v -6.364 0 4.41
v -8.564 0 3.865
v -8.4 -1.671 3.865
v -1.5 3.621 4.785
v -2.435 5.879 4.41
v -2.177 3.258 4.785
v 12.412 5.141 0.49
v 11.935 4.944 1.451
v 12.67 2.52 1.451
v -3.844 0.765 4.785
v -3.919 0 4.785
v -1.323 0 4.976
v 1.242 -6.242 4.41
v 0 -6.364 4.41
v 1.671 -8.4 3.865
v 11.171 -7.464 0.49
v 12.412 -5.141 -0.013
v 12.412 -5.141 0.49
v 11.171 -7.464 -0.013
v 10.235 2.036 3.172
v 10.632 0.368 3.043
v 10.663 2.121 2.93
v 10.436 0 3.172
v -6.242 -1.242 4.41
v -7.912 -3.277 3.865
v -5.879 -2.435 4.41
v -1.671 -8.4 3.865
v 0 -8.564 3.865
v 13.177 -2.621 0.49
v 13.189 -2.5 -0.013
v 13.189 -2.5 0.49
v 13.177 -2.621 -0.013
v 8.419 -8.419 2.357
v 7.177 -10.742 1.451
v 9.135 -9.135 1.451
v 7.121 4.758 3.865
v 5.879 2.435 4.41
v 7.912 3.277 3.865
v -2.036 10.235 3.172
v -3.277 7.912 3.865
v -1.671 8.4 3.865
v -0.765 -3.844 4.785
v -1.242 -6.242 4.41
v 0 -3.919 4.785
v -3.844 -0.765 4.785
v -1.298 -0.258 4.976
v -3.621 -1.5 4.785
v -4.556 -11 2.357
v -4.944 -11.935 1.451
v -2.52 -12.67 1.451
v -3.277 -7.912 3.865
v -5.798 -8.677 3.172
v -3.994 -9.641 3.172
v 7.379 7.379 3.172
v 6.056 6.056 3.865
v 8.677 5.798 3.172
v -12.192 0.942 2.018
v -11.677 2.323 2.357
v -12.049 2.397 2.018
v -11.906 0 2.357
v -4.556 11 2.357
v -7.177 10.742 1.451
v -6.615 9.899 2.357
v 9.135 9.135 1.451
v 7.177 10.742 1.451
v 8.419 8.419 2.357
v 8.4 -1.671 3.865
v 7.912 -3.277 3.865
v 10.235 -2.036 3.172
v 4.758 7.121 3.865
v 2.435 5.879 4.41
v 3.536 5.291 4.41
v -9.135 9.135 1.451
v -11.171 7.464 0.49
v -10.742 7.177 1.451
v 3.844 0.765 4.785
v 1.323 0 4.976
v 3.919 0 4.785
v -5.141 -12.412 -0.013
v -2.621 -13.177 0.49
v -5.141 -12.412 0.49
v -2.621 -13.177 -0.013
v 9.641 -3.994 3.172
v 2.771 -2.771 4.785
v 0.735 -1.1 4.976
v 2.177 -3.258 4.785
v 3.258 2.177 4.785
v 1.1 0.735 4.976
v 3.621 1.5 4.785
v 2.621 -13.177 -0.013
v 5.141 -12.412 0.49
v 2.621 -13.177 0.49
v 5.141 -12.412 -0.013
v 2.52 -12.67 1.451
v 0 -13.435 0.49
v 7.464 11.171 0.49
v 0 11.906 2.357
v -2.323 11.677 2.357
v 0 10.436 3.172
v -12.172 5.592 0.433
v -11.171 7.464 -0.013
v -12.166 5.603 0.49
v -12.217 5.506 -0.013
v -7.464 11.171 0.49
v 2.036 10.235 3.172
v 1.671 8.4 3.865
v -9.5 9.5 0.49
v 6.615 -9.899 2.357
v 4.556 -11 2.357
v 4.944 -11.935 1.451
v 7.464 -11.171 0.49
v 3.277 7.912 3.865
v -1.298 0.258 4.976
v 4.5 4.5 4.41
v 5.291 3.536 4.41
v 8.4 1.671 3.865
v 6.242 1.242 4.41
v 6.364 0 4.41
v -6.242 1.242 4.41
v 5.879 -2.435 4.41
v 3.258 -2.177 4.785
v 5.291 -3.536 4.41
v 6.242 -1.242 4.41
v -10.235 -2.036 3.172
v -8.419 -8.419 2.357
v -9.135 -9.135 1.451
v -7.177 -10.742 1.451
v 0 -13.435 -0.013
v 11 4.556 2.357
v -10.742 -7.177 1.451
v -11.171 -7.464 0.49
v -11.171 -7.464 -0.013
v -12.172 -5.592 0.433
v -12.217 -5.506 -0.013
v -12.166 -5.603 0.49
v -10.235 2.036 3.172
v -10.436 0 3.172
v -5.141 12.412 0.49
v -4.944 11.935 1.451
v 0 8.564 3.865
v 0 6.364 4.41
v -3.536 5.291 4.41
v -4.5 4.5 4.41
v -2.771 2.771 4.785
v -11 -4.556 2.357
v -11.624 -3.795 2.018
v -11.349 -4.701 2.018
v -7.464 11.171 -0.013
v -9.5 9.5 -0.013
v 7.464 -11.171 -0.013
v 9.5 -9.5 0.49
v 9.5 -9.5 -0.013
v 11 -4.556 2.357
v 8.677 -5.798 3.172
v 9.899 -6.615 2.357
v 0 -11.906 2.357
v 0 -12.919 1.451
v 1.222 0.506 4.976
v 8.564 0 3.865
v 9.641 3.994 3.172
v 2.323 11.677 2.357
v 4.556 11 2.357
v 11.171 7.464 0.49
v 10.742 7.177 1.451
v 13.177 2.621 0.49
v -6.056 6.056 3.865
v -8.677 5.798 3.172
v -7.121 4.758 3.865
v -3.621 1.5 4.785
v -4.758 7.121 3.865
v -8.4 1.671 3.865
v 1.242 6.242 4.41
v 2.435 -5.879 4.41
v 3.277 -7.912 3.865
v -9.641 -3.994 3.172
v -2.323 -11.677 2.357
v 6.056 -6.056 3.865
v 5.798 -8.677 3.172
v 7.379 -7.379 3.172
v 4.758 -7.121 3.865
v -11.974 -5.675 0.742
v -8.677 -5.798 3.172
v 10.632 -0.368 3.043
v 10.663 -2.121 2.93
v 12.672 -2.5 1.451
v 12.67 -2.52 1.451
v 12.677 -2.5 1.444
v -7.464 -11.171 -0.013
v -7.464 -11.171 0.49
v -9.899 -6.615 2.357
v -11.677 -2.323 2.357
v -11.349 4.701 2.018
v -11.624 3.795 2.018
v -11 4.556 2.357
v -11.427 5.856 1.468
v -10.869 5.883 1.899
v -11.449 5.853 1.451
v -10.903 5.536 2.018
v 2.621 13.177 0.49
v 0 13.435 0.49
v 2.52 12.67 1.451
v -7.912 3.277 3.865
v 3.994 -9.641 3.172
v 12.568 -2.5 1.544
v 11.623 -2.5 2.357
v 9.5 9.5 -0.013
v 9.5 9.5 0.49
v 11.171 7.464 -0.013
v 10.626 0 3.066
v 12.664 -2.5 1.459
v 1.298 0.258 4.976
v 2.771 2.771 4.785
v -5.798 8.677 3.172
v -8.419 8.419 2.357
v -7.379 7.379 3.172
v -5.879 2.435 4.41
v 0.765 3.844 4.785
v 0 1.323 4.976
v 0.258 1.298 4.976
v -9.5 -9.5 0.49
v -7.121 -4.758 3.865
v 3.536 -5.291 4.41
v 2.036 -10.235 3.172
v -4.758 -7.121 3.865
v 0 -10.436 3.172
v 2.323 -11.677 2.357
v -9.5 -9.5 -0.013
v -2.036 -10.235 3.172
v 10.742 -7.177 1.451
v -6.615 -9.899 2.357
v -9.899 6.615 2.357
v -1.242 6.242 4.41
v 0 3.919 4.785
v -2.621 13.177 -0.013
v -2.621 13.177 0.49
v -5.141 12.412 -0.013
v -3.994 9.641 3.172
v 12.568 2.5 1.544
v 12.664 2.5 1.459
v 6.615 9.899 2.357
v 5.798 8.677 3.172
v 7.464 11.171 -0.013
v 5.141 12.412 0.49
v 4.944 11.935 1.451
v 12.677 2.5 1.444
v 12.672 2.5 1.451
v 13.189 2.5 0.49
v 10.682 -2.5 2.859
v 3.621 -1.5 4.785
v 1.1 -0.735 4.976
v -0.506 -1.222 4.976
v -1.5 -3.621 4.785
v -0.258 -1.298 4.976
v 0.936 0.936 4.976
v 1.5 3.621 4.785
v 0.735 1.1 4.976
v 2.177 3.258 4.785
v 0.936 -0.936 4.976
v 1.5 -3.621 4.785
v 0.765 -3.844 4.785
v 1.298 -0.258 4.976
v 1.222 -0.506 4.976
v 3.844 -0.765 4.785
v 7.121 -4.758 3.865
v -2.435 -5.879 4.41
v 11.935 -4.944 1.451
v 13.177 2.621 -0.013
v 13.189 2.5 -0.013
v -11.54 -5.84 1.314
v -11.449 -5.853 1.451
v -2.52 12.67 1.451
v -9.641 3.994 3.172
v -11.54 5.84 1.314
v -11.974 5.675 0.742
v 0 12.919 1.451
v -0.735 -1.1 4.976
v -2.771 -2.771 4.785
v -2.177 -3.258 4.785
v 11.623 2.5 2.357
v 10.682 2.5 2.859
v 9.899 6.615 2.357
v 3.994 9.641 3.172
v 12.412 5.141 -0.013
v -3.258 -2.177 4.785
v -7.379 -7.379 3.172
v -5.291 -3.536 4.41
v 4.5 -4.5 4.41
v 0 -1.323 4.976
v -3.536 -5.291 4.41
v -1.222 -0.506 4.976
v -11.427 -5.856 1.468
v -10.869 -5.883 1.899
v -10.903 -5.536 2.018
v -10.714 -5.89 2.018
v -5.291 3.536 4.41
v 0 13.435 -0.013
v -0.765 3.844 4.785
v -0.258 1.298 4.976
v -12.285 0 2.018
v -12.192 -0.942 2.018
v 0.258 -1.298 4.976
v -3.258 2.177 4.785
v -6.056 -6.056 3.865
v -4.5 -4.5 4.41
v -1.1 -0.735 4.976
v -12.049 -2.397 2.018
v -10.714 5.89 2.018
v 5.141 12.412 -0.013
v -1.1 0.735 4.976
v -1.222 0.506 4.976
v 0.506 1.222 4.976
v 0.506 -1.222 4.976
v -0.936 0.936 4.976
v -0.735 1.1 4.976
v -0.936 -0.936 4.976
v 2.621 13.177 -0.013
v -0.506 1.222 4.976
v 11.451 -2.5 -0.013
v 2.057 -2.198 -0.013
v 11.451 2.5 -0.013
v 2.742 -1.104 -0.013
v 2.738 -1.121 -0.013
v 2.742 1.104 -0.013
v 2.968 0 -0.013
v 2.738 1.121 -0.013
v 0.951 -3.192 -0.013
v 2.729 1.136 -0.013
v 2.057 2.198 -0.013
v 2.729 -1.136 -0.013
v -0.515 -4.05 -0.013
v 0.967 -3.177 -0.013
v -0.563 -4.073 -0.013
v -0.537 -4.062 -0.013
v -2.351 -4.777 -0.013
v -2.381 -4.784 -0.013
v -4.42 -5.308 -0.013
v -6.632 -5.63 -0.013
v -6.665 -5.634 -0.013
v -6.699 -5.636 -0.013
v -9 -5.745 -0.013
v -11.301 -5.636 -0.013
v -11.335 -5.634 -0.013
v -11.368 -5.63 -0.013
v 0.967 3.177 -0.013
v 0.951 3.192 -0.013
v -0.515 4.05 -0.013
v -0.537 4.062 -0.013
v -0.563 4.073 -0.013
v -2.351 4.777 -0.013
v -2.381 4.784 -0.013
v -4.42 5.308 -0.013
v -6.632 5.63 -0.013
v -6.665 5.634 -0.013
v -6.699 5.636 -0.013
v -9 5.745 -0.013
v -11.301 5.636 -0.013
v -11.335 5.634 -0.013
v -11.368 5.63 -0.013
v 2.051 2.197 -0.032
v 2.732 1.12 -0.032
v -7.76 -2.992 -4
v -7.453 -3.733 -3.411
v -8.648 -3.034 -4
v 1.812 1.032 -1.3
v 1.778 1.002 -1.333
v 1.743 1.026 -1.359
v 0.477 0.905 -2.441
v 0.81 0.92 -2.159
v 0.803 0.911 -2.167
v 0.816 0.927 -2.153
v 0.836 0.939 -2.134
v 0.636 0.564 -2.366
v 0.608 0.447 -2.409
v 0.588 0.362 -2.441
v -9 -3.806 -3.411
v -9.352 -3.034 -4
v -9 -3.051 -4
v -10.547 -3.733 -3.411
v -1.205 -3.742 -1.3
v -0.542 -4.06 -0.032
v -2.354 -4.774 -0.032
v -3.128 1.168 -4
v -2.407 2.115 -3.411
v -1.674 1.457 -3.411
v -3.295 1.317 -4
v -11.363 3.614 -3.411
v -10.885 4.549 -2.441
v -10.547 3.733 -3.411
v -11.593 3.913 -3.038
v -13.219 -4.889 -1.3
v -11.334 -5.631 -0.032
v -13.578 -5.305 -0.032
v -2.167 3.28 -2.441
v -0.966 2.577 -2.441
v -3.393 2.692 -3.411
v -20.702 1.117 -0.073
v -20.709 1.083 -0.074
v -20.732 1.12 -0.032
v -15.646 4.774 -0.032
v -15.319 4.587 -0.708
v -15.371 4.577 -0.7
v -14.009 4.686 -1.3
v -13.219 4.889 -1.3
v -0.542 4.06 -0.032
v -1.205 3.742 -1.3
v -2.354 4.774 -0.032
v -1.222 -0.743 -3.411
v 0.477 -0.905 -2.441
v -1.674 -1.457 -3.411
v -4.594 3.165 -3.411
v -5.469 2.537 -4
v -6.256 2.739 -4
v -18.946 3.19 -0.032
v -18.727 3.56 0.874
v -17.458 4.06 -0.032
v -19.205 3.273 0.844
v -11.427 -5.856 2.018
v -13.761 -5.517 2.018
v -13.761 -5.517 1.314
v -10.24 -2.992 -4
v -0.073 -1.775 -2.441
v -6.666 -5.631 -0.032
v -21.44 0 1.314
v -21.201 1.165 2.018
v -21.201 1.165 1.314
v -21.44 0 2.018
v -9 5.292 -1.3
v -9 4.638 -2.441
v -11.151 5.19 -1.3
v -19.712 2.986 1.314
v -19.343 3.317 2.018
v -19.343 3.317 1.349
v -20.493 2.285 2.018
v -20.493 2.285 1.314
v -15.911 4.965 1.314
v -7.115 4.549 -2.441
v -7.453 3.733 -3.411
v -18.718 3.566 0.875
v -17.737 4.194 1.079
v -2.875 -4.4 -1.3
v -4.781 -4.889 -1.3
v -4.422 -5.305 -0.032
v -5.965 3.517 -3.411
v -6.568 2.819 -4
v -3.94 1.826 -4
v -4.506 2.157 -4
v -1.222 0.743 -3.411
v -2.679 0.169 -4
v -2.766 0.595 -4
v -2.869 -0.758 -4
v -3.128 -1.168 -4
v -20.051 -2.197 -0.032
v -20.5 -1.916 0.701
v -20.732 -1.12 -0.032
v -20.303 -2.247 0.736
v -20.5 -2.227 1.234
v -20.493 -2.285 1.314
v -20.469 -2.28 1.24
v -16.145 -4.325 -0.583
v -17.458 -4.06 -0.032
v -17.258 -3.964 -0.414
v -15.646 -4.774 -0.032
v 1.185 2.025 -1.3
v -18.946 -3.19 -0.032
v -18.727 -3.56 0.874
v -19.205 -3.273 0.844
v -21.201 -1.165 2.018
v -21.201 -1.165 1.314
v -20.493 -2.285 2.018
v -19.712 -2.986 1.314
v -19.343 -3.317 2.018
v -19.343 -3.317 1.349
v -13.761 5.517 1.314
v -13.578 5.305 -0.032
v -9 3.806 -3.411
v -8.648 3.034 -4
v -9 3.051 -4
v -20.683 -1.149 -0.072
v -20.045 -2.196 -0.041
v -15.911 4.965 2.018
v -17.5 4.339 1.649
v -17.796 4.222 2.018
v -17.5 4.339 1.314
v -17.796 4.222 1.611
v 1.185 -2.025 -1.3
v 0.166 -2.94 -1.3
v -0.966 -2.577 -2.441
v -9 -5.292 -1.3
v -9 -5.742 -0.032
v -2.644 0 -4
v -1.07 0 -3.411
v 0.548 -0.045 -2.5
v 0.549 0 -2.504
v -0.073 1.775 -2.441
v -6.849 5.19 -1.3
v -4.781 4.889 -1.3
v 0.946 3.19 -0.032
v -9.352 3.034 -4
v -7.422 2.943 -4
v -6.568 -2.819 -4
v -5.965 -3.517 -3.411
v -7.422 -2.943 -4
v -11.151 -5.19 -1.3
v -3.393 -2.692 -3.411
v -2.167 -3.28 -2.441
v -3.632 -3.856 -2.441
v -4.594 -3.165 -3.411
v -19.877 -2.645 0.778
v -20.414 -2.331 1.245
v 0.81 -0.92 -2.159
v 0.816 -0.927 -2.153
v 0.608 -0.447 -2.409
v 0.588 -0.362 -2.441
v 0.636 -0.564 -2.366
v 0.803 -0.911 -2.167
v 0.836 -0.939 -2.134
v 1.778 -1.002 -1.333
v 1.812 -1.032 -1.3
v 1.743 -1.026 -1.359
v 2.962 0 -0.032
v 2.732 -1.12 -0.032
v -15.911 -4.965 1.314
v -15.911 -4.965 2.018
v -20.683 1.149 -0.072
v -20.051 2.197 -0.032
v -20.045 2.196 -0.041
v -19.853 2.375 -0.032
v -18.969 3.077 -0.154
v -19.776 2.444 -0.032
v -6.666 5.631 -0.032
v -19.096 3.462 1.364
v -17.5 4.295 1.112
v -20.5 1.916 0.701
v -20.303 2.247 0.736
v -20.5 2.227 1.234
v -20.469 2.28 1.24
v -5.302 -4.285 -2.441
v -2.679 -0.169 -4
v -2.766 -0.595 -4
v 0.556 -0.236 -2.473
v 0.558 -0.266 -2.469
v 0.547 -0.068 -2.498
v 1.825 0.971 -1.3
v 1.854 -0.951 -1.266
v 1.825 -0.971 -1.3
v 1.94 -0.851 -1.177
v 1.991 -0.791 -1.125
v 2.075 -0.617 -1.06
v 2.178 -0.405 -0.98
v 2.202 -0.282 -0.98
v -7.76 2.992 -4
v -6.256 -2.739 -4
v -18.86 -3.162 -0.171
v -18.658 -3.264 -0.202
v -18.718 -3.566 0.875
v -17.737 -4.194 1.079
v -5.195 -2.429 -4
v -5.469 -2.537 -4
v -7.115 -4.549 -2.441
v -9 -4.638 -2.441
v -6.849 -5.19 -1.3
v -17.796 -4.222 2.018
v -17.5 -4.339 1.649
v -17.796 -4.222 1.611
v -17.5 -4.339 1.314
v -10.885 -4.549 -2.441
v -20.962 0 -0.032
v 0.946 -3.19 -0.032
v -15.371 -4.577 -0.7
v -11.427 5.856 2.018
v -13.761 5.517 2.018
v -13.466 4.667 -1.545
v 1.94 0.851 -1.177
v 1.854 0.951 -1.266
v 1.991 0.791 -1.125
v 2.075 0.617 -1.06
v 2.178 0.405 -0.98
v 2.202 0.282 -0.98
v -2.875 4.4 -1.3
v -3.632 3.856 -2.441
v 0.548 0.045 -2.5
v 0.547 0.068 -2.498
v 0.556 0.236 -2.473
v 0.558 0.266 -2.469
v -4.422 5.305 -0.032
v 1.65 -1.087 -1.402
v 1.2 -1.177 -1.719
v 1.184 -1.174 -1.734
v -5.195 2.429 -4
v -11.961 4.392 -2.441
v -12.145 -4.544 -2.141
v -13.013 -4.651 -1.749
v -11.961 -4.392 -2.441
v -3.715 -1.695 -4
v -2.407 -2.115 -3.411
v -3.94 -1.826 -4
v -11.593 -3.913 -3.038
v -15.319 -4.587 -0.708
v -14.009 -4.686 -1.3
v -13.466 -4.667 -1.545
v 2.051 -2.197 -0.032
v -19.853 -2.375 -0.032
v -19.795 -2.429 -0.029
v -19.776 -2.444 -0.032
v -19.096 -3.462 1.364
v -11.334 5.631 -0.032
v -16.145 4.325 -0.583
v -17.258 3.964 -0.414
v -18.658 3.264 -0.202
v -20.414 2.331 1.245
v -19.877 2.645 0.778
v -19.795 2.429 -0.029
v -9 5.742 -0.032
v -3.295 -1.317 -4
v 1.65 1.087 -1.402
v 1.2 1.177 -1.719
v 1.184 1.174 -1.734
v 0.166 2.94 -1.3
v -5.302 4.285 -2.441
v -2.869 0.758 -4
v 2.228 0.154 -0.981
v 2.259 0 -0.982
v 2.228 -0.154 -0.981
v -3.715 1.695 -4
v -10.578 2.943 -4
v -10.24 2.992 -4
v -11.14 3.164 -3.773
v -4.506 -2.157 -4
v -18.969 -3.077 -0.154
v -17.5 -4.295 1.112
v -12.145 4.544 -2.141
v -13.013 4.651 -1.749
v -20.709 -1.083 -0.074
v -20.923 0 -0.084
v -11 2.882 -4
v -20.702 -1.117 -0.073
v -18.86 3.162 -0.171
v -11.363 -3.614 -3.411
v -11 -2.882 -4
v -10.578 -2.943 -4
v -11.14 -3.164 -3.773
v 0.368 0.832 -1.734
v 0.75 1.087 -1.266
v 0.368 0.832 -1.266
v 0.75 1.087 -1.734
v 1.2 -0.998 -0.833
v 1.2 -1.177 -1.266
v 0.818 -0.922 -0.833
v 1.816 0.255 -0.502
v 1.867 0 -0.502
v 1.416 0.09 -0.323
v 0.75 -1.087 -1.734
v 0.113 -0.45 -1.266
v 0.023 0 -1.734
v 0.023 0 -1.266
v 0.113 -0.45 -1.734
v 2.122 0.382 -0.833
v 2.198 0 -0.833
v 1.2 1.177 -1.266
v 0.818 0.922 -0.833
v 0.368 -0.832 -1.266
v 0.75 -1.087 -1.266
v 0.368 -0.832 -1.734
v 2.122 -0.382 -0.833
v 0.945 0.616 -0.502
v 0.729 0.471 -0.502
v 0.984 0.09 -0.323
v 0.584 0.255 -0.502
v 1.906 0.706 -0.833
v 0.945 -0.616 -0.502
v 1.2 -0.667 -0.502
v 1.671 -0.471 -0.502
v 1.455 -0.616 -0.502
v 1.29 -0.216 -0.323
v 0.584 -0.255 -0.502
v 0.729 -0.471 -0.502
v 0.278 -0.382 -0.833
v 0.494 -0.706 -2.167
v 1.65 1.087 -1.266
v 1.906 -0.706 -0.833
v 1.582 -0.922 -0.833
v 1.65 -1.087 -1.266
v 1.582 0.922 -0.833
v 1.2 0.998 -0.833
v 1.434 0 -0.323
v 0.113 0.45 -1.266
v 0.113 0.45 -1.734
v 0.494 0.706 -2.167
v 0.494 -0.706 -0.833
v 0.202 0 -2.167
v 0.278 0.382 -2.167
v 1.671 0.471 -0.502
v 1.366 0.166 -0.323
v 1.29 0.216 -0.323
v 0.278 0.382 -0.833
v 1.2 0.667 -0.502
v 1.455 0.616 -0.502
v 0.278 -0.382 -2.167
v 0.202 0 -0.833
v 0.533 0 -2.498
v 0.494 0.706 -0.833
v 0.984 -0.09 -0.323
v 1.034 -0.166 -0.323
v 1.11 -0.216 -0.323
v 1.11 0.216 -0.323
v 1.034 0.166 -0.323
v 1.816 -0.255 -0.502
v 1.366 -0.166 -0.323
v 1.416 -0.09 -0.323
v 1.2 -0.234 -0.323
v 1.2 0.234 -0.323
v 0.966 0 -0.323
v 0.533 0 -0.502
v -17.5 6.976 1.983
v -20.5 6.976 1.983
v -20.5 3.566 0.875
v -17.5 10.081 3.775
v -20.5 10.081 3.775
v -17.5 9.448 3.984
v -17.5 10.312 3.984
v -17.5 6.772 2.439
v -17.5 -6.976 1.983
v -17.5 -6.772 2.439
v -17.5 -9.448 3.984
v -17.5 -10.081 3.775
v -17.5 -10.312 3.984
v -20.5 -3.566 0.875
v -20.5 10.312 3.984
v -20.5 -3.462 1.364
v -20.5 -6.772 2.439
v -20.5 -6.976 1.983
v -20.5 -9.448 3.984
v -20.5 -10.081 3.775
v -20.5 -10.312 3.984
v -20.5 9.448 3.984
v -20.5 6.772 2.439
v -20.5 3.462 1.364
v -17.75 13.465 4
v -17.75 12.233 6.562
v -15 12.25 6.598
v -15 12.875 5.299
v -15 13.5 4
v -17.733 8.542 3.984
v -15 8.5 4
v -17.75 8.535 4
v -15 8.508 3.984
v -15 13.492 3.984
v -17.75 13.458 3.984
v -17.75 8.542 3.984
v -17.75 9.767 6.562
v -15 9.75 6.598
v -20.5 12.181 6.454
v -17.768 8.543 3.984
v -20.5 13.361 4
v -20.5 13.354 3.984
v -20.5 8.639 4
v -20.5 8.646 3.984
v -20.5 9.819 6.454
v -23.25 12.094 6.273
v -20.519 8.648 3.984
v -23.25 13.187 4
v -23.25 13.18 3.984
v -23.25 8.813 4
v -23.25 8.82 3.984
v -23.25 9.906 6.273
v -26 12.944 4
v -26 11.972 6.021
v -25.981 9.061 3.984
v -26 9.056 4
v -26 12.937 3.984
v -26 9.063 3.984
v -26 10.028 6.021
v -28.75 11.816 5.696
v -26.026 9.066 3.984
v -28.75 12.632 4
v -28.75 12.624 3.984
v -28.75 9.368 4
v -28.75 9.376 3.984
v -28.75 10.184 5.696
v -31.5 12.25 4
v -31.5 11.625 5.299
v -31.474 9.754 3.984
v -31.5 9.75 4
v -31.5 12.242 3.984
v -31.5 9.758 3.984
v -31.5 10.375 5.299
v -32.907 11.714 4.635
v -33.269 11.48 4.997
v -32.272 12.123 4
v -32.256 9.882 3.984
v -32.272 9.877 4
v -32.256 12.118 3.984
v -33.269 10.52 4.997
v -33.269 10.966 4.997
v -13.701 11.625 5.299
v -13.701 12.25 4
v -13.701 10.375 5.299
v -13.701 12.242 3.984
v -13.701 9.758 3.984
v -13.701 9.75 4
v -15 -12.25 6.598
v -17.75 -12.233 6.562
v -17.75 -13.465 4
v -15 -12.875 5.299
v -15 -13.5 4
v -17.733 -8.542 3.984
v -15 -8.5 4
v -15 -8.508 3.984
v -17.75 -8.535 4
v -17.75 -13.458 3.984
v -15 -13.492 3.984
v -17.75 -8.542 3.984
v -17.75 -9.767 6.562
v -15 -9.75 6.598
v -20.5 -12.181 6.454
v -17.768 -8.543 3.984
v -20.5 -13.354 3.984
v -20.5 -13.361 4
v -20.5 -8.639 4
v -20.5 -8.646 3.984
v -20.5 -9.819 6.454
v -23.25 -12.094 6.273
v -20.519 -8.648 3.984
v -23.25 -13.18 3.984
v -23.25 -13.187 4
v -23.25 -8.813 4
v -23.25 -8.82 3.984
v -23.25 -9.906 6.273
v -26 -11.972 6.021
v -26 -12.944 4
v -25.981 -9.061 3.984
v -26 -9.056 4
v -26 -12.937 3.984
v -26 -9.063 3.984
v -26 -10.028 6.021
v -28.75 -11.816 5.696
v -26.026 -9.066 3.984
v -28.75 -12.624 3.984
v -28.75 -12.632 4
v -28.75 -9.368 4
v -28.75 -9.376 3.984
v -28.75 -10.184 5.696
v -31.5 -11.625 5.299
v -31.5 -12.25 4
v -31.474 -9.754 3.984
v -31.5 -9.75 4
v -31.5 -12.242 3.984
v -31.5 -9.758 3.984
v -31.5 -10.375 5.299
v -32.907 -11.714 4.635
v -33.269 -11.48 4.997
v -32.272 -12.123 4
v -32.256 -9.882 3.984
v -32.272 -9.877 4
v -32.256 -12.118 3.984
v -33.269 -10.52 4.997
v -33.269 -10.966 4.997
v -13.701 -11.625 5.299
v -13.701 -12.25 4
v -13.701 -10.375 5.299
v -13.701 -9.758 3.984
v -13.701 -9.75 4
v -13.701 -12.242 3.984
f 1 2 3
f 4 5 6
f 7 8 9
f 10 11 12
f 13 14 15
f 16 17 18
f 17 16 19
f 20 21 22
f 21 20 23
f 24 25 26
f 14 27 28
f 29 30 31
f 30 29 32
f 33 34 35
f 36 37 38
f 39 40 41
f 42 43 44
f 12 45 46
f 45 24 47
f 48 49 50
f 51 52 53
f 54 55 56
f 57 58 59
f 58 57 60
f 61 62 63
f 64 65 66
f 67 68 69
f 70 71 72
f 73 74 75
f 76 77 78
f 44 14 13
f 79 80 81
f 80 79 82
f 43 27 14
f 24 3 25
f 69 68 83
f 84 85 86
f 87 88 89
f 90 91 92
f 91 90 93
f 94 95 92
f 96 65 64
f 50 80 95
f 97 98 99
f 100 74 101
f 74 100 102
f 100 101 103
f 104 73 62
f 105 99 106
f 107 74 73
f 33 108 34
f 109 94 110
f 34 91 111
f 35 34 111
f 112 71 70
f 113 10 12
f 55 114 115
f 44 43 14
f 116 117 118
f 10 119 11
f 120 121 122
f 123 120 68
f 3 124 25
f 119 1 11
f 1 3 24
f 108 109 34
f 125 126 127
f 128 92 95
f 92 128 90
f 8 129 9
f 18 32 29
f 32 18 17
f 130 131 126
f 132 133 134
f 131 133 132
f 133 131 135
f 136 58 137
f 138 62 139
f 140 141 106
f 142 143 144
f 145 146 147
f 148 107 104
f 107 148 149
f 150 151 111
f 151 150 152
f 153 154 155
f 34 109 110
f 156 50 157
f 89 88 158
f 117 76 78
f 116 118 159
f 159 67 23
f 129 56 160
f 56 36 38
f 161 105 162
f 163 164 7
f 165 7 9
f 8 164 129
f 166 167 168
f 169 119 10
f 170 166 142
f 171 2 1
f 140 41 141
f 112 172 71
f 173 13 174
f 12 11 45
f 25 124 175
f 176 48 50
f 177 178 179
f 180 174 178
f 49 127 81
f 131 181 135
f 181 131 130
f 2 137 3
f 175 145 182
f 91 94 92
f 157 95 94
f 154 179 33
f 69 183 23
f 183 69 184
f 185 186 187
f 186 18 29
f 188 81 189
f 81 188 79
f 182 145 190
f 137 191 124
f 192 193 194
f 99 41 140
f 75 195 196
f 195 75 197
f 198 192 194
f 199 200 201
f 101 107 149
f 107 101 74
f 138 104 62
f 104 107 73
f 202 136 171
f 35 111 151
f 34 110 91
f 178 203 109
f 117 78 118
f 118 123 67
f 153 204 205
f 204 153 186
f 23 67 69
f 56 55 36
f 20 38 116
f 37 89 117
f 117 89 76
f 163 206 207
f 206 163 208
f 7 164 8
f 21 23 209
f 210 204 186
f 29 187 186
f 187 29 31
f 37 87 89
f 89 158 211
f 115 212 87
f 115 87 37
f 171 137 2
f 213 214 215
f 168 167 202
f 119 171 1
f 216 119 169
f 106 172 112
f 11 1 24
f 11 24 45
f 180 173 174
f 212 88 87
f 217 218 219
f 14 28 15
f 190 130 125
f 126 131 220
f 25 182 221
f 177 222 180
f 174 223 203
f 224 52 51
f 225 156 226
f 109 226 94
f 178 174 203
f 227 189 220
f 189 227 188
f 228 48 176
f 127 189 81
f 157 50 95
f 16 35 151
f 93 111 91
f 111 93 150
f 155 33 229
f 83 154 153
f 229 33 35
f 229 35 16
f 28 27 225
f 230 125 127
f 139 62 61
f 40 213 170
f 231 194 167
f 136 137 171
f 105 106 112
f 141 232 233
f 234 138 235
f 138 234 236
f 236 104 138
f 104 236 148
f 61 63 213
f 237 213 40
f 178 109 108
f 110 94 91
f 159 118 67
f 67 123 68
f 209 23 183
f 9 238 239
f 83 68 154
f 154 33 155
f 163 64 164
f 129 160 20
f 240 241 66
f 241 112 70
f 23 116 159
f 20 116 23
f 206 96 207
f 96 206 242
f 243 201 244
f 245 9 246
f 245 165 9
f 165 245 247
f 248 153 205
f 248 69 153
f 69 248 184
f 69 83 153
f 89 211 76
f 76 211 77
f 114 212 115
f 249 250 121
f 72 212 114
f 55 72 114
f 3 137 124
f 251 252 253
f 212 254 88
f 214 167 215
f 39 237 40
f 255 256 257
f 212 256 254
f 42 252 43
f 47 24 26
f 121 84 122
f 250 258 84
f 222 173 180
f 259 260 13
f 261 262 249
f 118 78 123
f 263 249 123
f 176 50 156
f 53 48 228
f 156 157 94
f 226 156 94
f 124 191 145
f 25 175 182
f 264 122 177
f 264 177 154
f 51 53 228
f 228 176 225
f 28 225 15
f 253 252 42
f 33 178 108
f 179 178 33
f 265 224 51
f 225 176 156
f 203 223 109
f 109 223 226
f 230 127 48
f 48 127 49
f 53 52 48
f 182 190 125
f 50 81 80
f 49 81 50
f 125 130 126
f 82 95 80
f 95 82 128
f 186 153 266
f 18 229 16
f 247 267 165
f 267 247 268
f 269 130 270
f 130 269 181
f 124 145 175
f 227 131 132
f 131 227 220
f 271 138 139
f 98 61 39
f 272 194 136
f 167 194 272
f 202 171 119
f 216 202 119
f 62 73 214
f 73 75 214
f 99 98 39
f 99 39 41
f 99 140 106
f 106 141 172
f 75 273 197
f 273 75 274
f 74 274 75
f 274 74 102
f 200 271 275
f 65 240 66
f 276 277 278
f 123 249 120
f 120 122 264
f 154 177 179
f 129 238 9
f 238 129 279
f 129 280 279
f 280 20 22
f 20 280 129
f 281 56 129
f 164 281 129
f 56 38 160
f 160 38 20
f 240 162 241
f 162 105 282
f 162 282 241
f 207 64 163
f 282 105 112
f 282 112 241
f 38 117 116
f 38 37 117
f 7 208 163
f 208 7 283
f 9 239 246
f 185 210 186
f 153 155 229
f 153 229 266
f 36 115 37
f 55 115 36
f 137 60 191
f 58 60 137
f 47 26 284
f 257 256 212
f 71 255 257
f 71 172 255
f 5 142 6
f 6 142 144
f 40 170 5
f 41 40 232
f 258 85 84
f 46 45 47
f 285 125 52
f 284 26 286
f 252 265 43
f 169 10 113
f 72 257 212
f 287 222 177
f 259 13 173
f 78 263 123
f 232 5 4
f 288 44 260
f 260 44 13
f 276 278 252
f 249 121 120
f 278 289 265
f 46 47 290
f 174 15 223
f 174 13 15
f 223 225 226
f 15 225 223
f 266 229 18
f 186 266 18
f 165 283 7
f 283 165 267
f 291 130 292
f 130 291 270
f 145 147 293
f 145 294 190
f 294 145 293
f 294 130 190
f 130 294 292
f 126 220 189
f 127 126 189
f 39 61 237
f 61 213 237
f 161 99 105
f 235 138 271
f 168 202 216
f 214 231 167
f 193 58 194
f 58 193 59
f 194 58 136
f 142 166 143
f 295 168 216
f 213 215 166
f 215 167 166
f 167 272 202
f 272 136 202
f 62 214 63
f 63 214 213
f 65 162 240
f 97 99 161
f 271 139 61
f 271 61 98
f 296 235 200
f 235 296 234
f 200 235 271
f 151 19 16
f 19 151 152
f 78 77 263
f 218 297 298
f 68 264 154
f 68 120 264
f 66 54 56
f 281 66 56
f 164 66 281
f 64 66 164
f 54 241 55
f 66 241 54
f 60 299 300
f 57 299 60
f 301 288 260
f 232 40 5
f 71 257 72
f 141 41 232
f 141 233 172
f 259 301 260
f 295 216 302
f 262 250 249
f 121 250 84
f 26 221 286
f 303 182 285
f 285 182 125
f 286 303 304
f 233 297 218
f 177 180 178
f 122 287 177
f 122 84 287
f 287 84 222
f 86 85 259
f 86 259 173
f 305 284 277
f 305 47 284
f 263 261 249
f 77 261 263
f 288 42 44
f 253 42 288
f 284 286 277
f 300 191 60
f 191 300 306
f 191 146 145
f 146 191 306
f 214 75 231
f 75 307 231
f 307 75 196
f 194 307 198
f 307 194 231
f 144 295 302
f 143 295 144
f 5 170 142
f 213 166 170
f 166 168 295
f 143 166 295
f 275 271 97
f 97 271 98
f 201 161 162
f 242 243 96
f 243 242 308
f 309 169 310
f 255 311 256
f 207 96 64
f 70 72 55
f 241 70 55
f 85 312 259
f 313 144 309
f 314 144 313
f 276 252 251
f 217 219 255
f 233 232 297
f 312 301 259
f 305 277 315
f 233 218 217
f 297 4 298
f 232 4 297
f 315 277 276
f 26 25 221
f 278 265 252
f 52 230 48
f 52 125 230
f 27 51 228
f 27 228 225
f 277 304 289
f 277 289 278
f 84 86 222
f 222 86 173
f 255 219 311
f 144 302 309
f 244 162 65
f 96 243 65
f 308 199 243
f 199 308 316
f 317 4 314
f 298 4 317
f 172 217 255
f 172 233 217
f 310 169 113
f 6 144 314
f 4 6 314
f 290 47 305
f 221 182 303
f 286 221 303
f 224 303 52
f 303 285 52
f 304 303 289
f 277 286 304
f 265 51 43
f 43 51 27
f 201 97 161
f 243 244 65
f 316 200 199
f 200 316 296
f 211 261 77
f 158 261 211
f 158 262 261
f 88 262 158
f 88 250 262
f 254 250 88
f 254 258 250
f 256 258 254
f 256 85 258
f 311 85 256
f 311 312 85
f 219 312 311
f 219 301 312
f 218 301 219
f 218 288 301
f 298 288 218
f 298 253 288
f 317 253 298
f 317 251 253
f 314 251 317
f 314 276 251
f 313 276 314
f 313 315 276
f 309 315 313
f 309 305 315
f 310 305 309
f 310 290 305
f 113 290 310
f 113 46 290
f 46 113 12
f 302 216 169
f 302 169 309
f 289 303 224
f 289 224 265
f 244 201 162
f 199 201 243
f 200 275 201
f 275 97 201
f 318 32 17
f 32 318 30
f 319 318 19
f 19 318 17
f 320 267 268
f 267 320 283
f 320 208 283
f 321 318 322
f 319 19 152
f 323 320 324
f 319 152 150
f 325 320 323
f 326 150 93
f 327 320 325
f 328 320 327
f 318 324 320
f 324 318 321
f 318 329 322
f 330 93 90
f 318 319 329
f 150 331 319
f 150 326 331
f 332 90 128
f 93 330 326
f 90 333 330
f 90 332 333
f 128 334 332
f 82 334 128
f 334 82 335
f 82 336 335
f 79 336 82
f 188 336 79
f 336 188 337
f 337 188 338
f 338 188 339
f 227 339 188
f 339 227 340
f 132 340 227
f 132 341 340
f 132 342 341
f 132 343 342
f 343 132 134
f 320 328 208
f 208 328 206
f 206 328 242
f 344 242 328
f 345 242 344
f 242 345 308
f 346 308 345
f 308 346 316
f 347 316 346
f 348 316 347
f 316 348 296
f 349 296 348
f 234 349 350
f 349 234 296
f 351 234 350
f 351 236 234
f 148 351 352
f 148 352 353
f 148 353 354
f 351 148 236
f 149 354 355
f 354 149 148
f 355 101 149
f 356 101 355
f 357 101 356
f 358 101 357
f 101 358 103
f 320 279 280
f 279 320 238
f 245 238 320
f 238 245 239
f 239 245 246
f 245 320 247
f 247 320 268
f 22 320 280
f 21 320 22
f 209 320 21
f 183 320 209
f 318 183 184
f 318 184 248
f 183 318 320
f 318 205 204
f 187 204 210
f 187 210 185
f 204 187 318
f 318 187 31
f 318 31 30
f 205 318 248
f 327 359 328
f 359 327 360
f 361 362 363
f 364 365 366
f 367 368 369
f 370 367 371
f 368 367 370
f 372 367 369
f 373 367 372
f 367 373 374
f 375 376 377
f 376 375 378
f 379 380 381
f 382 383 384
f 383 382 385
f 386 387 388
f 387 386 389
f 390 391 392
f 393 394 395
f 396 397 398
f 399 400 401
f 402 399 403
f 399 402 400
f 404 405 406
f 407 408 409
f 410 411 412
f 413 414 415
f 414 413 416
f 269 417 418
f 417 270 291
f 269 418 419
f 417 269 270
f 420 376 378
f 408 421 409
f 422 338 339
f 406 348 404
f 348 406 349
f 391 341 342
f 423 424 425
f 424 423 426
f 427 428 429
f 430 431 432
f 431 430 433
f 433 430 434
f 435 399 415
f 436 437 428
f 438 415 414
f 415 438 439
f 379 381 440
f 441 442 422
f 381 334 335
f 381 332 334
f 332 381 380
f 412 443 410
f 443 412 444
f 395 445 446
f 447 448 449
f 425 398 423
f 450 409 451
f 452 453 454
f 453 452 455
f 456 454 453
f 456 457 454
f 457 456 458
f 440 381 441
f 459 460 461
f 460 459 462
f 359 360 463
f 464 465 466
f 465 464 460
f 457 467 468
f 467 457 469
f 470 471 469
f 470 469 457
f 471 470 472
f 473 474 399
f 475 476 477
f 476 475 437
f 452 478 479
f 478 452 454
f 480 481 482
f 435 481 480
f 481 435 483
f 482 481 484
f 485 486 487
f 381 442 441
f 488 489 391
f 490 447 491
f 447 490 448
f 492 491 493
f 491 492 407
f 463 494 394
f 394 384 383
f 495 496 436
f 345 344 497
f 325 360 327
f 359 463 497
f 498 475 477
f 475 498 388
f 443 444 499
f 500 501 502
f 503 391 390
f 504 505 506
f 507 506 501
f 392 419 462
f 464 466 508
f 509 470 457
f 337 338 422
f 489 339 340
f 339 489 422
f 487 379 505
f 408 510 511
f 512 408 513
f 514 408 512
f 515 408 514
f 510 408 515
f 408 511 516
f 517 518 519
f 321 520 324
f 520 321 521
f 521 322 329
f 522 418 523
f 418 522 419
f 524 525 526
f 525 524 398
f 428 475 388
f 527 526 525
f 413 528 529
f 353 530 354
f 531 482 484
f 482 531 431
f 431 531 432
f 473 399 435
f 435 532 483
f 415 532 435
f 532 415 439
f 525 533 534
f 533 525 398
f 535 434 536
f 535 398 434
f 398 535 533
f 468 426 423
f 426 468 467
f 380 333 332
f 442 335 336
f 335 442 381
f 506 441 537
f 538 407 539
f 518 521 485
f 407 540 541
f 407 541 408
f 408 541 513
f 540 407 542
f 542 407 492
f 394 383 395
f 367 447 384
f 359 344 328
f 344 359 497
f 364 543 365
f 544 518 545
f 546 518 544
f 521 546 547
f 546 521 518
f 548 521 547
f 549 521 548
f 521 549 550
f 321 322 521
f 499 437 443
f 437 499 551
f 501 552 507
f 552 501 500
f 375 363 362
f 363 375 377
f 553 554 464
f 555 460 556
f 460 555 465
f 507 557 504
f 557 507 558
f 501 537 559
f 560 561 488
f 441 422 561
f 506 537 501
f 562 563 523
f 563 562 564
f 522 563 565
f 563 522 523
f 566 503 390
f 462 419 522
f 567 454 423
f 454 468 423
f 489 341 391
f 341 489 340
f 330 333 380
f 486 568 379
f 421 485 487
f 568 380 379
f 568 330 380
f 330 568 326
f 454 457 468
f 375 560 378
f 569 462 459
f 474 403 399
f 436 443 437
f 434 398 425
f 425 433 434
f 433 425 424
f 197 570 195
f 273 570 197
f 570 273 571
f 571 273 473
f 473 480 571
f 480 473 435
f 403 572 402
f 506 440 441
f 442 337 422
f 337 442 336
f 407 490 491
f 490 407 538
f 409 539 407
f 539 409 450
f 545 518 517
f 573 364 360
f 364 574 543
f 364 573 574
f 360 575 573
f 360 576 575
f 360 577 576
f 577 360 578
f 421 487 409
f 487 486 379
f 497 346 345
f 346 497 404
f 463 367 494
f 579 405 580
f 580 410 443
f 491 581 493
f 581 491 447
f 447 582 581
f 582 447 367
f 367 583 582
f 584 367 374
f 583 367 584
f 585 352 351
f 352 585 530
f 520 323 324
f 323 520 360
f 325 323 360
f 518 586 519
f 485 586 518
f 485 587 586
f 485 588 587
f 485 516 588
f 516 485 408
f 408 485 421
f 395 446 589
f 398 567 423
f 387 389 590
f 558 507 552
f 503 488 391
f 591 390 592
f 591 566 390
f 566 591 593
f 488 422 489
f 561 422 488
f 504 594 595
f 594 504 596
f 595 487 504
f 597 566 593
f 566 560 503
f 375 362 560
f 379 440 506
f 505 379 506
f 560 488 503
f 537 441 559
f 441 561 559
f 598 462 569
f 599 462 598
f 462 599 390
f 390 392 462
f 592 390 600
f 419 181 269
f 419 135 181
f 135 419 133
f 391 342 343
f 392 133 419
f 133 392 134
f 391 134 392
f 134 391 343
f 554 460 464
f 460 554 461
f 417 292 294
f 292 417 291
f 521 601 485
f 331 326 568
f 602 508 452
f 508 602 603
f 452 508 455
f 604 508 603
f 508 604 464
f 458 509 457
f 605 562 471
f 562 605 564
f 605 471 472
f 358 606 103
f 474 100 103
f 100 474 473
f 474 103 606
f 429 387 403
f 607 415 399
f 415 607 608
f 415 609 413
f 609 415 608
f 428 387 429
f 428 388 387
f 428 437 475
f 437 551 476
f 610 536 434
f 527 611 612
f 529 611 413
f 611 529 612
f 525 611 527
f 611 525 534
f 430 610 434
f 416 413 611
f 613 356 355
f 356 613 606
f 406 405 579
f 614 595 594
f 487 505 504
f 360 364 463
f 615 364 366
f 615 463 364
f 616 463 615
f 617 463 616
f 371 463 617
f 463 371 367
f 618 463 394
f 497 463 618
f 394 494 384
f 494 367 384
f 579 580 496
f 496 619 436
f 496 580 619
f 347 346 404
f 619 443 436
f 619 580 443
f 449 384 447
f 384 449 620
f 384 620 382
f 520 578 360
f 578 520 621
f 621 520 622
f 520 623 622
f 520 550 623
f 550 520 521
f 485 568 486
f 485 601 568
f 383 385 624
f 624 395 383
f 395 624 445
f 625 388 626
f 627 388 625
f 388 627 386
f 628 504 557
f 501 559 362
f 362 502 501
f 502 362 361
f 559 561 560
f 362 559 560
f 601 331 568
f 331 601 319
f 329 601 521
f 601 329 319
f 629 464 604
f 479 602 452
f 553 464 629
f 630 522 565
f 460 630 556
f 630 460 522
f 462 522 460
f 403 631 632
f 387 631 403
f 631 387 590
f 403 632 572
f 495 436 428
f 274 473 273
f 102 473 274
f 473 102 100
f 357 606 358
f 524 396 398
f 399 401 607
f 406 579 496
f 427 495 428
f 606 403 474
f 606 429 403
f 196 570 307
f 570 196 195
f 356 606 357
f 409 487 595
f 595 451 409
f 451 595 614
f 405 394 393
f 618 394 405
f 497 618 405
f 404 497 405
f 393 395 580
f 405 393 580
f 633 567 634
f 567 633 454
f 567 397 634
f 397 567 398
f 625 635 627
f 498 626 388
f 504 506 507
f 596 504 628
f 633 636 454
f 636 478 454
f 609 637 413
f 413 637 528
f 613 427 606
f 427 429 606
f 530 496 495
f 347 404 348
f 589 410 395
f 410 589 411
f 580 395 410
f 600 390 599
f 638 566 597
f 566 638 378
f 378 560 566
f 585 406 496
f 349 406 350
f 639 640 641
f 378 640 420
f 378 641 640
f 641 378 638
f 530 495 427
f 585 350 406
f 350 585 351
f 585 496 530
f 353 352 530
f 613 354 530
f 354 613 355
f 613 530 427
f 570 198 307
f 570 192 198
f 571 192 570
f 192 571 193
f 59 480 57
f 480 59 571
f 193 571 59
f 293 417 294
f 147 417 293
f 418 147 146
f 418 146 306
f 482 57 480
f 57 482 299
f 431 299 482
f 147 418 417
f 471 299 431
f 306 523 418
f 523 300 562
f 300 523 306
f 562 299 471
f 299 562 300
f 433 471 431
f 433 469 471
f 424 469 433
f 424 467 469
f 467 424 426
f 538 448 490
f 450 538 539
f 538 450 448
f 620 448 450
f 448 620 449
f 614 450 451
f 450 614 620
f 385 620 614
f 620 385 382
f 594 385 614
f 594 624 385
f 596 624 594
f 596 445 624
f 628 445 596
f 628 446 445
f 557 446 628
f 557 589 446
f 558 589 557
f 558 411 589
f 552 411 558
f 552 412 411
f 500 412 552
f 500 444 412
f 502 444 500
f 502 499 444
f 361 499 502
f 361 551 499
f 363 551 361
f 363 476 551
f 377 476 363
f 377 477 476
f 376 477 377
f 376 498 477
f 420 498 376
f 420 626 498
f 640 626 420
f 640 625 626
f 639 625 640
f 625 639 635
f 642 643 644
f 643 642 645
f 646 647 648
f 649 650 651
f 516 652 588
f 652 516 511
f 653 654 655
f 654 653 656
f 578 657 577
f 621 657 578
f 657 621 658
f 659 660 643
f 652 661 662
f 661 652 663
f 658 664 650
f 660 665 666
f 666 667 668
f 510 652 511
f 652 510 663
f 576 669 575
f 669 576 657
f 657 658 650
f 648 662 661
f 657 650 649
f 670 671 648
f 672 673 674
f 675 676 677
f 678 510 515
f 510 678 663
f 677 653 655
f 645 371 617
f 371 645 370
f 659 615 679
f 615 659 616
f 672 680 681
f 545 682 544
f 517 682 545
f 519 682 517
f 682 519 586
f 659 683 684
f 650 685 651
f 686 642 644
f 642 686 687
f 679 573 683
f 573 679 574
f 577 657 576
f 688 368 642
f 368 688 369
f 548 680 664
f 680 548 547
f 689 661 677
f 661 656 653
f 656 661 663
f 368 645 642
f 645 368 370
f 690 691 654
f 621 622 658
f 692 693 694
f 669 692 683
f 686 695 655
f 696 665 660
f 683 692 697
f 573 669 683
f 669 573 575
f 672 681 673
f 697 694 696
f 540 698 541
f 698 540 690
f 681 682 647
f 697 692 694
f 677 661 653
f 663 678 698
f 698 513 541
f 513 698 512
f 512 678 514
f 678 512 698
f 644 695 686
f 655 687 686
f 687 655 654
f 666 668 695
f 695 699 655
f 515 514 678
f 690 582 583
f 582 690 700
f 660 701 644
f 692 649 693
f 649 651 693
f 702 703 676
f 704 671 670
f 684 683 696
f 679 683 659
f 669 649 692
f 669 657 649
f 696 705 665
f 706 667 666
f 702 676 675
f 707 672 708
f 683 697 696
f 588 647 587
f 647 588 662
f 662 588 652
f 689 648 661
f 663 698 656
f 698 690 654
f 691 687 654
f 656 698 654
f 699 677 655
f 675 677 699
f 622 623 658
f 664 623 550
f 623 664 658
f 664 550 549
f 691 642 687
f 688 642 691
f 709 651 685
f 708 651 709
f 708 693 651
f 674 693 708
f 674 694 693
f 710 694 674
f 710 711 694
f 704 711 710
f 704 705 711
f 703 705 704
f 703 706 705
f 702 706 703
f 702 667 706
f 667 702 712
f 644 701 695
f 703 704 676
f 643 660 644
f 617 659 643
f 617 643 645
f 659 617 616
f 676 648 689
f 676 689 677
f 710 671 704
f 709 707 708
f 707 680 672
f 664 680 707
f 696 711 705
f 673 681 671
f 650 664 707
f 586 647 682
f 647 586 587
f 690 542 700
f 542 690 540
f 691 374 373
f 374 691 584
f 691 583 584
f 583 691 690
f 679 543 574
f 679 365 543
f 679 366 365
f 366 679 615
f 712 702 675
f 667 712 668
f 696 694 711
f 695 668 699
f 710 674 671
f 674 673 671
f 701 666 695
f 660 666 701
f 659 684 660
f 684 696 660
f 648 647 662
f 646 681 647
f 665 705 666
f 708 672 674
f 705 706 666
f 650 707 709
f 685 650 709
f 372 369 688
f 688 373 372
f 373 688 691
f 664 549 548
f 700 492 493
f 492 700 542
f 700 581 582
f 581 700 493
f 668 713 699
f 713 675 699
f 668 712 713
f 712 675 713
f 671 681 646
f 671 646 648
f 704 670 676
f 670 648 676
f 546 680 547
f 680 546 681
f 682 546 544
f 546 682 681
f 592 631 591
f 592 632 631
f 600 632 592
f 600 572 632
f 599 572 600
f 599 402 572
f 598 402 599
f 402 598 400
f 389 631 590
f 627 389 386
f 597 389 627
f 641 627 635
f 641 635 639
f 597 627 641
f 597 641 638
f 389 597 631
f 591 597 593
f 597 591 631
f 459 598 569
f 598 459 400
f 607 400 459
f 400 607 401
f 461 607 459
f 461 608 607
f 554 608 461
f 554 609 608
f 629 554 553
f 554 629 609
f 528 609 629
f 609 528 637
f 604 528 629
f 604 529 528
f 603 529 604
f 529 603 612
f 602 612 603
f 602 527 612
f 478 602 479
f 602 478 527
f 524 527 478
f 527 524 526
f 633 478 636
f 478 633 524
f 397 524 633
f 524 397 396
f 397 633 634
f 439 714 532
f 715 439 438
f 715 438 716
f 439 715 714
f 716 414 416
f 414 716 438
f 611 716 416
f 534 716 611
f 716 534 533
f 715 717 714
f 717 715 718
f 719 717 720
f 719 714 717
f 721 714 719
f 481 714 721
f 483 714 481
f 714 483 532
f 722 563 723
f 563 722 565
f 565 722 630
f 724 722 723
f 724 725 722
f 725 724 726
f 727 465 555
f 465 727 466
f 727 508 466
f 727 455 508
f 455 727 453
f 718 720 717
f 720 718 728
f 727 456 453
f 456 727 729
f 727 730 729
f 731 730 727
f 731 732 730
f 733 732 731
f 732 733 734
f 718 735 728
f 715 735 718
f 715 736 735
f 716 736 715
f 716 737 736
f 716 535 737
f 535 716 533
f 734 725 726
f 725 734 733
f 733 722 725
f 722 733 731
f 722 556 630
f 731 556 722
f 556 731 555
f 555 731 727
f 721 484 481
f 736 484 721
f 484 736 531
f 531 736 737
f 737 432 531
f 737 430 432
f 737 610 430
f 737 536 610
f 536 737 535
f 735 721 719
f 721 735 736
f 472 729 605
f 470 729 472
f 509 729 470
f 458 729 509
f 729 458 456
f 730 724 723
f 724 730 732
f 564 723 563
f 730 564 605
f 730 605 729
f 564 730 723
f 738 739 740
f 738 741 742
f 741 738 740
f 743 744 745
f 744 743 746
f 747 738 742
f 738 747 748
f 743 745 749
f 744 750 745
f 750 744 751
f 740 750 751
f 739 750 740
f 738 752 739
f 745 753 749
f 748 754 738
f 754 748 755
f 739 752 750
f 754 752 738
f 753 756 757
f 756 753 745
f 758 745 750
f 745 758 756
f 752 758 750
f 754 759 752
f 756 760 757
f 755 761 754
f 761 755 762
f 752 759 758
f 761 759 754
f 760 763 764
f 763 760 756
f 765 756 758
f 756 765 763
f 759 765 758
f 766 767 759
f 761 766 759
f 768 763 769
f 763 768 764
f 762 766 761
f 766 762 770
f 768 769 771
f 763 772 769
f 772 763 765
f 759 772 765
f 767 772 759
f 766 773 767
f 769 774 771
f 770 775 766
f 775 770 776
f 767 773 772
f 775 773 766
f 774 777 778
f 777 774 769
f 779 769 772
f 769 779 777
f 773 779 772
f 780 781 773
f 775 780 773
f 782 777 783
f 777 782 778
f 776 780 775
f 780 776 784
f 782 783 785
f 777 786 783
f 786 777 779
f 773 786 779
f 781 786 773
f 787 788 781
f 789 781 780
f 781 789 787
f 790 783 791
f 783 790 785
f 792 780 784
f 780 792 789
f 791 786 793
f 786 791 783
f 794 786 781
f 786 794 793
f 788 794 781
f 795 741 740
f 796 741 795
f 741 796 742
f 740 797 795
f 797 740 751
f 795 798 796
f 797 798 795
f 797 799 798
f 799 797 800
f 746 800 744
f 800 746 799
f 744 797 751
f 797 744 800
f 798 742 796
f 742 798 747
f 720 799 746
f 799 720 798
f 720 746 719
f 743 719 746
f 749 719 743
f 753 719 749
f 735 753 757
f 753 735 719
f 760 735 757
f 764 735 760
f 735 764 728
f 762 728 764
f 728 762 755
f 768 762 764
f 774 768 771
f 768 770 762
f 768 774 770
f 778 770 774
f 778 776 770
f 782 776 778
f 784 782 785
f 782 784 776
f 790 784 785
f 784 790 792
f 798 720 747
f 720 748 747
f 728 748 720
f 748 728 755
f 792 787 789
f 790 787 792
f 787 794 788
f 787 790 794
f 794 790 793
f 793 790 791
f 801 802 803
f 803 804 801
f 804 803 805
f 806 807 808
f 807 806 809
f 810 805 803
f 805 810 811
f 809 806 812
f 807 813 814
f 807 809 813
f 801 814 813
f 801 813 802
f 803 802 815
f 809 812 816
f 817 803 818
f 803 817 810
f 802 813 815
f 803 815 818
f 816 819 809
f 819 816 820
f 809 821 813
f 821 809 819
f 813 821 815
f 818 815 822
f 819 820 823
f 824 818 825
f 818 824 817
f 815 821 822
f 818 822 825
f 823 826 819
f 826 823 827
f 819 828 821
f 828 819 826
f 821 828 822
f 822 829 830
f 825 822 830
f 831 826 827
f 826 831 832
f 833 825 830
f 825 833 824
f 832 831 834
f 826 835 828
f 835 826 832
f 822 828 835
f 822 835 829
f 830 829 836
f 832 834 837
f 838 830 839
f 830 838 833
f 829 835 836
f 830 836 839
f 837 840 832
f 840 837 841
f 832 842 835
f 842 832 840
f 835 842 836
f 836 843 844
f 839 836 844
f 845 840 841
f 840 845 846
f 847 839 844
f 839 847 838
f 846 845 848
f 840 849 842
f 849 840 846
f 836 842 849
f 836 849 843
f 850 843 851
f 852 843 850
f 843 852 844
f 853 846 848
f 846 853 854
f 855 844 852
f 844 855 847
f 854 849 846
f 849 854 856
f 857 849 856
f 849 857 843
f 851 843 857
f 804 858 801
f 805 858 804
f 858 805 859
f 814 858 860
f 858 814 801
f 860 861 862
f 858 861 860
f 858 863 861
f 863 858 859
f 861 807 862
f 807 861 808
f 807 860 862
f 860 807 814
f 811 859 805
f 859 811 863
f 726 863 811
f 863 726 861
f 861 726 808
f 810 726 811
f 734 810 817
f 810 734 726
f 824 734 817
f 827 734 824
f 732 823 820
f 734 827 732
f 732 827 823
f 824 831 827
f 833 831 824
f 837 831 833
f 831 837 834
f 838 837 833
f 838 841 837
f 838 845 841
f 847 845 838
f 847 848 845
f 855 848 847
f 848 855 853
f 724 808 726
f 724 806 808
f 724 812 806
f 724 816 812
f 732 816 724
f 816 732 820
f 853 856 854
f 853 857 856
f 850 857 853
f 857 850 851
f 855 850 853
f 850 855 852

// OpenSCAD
// file: ../lib/util.scad
fn1 = 32;
fn2 = 16;

module util_half_sphere(radius, fn=fn1) {
    difference() {
        sphere(radius, $fn=fn);
        translate([0,0,-(radius+radius/19)])
            cube(2*radius+radius/10, center=true);
    }
}

function gcd(a,b) = a == b ? a : a > b ? gcd(a-b, b) : gcd(a, b-a);

module util_saucer(length, width, height, fn=fn1) {
    rad = gcd(length,gcd(width,height));
    //rad = 10;
    scale([length/(2*rad), width/(2*rad), height/rad])
        util_half_sphere(rad, fn);
}

module util_half_cylinder(length, radius, inner_fn=fn2, outer_fn=fn1) {
    maxval = max(length, 2*radius);
    intersection() {
        difference() {
            rotate([0,90,0])
                translate([0,0,-(length/2 + length/20)])
                    cylinder(length+length/10, radius, radius, $fn=inner_fn);
            
            translate([0,0,(maxval/2 + maxval/19)])
                cube(maxval+maxval/10, center=true);
        }
        
        translate([0,0,-(radius+radius/20)])
            cylinder(radius + radius/10, length/2, length/2, $fn=outer_fn);
    }
}

module util_body(length, width, height, upper_height, fn=fn1) {
    rad = gcd(length, gcd(width, upper_height));
    
    scale(.995) scale([length/(2*rad), width/(2*rad), 1])
        util_half_cylinder(2*rad, height, outer_fn=fn);
}

module util_graded_cylinder(height, radius_start, radius_end, grades=1, fn=fn1) {
    height_grade = height / grades;
    radius_grade = (radius_start - radius_end) / (grades * grades);
    for (i = [0 : 1 : grades]) {
        translate([0,0,i*height_grade])
            cylinder(height_grade, 
                     radius_start - i*radius_grade * i,
                     radius_start - (i+1) * radius_grade * (i+1),
                     $fn = fn);
    }
}

module util_nacelle(length, width, height, curved=false, up=true, front_bulge=false) {
    rad = min(width, height/2);
    grads = curved ? 6 : 1;
    scale_factor = front_bulge ? 1.1 : 1;
    direction = up ? -1 : 1;
    difference() {
        scale([1, width/ (2*rad), height/rad])
            difference() {
                union() {
                    rotate([0,-90,0])
                        rotate(30)
                            util_graded_cylinder(length-rad, rad, rad/2, grads, 6);
                    scale(scale_factor) 
                        rotate([0,90,0]) rotate(90) sphere(rad, $fn=6);
                }
                
                translate([-length/2, 0, direction * (height/2 + height/19)])
                    cube([length+length, width+width, height+height/10], center=true);
            }
        
        translate([-length-(curved?length/3:0), 0, -length/3])
            rotate([0,-45,0])
                cube(length, center=true);
    }
}

module util_mirrored(v) {
    children();
    mirror(v) children();
}

module util_ring(outer, inner, height) {
    difference() {
        translate([0,0,-height/2])
            cylinder(height, outer, outer);
        translate([0,0,-(height/2 + height/19)])
            cylinder(height+height/10, inner, inner);
    }
}

module util_star(radius, thick, num, half=false) {
    angle = 360/num;
    offset = half? angle/2 : 0;
    for (i = [0: 1: num]) {
        rotate(i* angle + offset)
            translate([radius/2,0,0])
                cube([radius, thick, thick], center=true);
    }
}

module util_ring_star(radius, thick, num, inner, half=false) {
    outer=inner+thick;
    avg = (inner + outer)/2;
    union() {
        difference() {
            util_star(radius, thick, num, half);
            cylinder(2*thick, outer, outer, $fn=num, center=true);
        }
        util_ring(outer, inner, thick);
    }
}

module util_hangar_disk(height, lower, upper, num, fn=fn1) {
    difference() {
            cylinder(height, lower, upper, $fn=fn, center=true);
        difference() {
            scale([1,1,22])
                util_star(1.1*upper, height/20, num, half=true);
            scale(.95)
                cylinder(height, lower, upper, $fn=fn, center=true);
        }
    }
}

module util_hangar_form(length, width, height, num, inner=0) {
    l = 0.6* max(length, width);
    h = 2.5* height;
    thick = min(height/20,1);
    inner = inner == 0 ? l/3 : inner;
    difference() {
        children();
        scale([1,1,h/thick]) 
            util_ring_star(l, thick, num, inner, half=true);
    }
    scale(.95) children();
}

module util_nacelle_bar(span, height, width, thickness) {
    rad = (span*span/(8*height) + height/2);
    outer = rad + thickness/2;
    inner = rad - thickness/2;
    difference(){
        translate([0,0,outer])
            rotate([0,90,0])
                util_ring(outer, inner, width);
    
        translate([0,0,1.1*outer+height])
            cube(2.2*outer, center=true);
    }
}
// main file
use <../lib/util.scad>;

module dip_saucer() {
    difference() {
        util_saucer(27,27,5);
        //dip_body();
        translate([13.5,0,2]) 
            rotate([0,-15,0])
            cube(5, center=true);
    }
    
}

module dip_body() {
    difference() {
        translate([-9,0,2])
            mirror([0,0,1])
                util_saucer(25,12,7);
        
        union() {
            translate([-9,0,-13])
                cube(18, center=true);
            
            translate([1.2,0,-1.5])
                sphere(1.2, $fn=16);
            
            translate([-21,0,-4])
                scale([2.5,1,1])
                rotate([90,0,0])
                    cylinder(12,4,4, center=true);
        }
    }
}


module dip_nacelle_assembly() {
    translate([-19,0,0.5])
        util_nacelle_bar(24,5,3,.5);
    
    util_mirrored([0,1,0])
        translate([-15,11,4])
            util_nacelle(18,5,3,curved=true);
}

module dip_main() {
    dip_saucer();
    dip_body();
    dip_nacelle_assembly();
}

module diplomat() {
    scale(1) dip_main();
}

diplomat();

module dip_msd() {
    projection(cut=true) rotate([-90,0,0]) union() {
        dip_body();
        dip_saucer();
        translate([-15,0,4]) util_nacelle(18,5,3,curved=true);
    }
}

//dip_msd();
